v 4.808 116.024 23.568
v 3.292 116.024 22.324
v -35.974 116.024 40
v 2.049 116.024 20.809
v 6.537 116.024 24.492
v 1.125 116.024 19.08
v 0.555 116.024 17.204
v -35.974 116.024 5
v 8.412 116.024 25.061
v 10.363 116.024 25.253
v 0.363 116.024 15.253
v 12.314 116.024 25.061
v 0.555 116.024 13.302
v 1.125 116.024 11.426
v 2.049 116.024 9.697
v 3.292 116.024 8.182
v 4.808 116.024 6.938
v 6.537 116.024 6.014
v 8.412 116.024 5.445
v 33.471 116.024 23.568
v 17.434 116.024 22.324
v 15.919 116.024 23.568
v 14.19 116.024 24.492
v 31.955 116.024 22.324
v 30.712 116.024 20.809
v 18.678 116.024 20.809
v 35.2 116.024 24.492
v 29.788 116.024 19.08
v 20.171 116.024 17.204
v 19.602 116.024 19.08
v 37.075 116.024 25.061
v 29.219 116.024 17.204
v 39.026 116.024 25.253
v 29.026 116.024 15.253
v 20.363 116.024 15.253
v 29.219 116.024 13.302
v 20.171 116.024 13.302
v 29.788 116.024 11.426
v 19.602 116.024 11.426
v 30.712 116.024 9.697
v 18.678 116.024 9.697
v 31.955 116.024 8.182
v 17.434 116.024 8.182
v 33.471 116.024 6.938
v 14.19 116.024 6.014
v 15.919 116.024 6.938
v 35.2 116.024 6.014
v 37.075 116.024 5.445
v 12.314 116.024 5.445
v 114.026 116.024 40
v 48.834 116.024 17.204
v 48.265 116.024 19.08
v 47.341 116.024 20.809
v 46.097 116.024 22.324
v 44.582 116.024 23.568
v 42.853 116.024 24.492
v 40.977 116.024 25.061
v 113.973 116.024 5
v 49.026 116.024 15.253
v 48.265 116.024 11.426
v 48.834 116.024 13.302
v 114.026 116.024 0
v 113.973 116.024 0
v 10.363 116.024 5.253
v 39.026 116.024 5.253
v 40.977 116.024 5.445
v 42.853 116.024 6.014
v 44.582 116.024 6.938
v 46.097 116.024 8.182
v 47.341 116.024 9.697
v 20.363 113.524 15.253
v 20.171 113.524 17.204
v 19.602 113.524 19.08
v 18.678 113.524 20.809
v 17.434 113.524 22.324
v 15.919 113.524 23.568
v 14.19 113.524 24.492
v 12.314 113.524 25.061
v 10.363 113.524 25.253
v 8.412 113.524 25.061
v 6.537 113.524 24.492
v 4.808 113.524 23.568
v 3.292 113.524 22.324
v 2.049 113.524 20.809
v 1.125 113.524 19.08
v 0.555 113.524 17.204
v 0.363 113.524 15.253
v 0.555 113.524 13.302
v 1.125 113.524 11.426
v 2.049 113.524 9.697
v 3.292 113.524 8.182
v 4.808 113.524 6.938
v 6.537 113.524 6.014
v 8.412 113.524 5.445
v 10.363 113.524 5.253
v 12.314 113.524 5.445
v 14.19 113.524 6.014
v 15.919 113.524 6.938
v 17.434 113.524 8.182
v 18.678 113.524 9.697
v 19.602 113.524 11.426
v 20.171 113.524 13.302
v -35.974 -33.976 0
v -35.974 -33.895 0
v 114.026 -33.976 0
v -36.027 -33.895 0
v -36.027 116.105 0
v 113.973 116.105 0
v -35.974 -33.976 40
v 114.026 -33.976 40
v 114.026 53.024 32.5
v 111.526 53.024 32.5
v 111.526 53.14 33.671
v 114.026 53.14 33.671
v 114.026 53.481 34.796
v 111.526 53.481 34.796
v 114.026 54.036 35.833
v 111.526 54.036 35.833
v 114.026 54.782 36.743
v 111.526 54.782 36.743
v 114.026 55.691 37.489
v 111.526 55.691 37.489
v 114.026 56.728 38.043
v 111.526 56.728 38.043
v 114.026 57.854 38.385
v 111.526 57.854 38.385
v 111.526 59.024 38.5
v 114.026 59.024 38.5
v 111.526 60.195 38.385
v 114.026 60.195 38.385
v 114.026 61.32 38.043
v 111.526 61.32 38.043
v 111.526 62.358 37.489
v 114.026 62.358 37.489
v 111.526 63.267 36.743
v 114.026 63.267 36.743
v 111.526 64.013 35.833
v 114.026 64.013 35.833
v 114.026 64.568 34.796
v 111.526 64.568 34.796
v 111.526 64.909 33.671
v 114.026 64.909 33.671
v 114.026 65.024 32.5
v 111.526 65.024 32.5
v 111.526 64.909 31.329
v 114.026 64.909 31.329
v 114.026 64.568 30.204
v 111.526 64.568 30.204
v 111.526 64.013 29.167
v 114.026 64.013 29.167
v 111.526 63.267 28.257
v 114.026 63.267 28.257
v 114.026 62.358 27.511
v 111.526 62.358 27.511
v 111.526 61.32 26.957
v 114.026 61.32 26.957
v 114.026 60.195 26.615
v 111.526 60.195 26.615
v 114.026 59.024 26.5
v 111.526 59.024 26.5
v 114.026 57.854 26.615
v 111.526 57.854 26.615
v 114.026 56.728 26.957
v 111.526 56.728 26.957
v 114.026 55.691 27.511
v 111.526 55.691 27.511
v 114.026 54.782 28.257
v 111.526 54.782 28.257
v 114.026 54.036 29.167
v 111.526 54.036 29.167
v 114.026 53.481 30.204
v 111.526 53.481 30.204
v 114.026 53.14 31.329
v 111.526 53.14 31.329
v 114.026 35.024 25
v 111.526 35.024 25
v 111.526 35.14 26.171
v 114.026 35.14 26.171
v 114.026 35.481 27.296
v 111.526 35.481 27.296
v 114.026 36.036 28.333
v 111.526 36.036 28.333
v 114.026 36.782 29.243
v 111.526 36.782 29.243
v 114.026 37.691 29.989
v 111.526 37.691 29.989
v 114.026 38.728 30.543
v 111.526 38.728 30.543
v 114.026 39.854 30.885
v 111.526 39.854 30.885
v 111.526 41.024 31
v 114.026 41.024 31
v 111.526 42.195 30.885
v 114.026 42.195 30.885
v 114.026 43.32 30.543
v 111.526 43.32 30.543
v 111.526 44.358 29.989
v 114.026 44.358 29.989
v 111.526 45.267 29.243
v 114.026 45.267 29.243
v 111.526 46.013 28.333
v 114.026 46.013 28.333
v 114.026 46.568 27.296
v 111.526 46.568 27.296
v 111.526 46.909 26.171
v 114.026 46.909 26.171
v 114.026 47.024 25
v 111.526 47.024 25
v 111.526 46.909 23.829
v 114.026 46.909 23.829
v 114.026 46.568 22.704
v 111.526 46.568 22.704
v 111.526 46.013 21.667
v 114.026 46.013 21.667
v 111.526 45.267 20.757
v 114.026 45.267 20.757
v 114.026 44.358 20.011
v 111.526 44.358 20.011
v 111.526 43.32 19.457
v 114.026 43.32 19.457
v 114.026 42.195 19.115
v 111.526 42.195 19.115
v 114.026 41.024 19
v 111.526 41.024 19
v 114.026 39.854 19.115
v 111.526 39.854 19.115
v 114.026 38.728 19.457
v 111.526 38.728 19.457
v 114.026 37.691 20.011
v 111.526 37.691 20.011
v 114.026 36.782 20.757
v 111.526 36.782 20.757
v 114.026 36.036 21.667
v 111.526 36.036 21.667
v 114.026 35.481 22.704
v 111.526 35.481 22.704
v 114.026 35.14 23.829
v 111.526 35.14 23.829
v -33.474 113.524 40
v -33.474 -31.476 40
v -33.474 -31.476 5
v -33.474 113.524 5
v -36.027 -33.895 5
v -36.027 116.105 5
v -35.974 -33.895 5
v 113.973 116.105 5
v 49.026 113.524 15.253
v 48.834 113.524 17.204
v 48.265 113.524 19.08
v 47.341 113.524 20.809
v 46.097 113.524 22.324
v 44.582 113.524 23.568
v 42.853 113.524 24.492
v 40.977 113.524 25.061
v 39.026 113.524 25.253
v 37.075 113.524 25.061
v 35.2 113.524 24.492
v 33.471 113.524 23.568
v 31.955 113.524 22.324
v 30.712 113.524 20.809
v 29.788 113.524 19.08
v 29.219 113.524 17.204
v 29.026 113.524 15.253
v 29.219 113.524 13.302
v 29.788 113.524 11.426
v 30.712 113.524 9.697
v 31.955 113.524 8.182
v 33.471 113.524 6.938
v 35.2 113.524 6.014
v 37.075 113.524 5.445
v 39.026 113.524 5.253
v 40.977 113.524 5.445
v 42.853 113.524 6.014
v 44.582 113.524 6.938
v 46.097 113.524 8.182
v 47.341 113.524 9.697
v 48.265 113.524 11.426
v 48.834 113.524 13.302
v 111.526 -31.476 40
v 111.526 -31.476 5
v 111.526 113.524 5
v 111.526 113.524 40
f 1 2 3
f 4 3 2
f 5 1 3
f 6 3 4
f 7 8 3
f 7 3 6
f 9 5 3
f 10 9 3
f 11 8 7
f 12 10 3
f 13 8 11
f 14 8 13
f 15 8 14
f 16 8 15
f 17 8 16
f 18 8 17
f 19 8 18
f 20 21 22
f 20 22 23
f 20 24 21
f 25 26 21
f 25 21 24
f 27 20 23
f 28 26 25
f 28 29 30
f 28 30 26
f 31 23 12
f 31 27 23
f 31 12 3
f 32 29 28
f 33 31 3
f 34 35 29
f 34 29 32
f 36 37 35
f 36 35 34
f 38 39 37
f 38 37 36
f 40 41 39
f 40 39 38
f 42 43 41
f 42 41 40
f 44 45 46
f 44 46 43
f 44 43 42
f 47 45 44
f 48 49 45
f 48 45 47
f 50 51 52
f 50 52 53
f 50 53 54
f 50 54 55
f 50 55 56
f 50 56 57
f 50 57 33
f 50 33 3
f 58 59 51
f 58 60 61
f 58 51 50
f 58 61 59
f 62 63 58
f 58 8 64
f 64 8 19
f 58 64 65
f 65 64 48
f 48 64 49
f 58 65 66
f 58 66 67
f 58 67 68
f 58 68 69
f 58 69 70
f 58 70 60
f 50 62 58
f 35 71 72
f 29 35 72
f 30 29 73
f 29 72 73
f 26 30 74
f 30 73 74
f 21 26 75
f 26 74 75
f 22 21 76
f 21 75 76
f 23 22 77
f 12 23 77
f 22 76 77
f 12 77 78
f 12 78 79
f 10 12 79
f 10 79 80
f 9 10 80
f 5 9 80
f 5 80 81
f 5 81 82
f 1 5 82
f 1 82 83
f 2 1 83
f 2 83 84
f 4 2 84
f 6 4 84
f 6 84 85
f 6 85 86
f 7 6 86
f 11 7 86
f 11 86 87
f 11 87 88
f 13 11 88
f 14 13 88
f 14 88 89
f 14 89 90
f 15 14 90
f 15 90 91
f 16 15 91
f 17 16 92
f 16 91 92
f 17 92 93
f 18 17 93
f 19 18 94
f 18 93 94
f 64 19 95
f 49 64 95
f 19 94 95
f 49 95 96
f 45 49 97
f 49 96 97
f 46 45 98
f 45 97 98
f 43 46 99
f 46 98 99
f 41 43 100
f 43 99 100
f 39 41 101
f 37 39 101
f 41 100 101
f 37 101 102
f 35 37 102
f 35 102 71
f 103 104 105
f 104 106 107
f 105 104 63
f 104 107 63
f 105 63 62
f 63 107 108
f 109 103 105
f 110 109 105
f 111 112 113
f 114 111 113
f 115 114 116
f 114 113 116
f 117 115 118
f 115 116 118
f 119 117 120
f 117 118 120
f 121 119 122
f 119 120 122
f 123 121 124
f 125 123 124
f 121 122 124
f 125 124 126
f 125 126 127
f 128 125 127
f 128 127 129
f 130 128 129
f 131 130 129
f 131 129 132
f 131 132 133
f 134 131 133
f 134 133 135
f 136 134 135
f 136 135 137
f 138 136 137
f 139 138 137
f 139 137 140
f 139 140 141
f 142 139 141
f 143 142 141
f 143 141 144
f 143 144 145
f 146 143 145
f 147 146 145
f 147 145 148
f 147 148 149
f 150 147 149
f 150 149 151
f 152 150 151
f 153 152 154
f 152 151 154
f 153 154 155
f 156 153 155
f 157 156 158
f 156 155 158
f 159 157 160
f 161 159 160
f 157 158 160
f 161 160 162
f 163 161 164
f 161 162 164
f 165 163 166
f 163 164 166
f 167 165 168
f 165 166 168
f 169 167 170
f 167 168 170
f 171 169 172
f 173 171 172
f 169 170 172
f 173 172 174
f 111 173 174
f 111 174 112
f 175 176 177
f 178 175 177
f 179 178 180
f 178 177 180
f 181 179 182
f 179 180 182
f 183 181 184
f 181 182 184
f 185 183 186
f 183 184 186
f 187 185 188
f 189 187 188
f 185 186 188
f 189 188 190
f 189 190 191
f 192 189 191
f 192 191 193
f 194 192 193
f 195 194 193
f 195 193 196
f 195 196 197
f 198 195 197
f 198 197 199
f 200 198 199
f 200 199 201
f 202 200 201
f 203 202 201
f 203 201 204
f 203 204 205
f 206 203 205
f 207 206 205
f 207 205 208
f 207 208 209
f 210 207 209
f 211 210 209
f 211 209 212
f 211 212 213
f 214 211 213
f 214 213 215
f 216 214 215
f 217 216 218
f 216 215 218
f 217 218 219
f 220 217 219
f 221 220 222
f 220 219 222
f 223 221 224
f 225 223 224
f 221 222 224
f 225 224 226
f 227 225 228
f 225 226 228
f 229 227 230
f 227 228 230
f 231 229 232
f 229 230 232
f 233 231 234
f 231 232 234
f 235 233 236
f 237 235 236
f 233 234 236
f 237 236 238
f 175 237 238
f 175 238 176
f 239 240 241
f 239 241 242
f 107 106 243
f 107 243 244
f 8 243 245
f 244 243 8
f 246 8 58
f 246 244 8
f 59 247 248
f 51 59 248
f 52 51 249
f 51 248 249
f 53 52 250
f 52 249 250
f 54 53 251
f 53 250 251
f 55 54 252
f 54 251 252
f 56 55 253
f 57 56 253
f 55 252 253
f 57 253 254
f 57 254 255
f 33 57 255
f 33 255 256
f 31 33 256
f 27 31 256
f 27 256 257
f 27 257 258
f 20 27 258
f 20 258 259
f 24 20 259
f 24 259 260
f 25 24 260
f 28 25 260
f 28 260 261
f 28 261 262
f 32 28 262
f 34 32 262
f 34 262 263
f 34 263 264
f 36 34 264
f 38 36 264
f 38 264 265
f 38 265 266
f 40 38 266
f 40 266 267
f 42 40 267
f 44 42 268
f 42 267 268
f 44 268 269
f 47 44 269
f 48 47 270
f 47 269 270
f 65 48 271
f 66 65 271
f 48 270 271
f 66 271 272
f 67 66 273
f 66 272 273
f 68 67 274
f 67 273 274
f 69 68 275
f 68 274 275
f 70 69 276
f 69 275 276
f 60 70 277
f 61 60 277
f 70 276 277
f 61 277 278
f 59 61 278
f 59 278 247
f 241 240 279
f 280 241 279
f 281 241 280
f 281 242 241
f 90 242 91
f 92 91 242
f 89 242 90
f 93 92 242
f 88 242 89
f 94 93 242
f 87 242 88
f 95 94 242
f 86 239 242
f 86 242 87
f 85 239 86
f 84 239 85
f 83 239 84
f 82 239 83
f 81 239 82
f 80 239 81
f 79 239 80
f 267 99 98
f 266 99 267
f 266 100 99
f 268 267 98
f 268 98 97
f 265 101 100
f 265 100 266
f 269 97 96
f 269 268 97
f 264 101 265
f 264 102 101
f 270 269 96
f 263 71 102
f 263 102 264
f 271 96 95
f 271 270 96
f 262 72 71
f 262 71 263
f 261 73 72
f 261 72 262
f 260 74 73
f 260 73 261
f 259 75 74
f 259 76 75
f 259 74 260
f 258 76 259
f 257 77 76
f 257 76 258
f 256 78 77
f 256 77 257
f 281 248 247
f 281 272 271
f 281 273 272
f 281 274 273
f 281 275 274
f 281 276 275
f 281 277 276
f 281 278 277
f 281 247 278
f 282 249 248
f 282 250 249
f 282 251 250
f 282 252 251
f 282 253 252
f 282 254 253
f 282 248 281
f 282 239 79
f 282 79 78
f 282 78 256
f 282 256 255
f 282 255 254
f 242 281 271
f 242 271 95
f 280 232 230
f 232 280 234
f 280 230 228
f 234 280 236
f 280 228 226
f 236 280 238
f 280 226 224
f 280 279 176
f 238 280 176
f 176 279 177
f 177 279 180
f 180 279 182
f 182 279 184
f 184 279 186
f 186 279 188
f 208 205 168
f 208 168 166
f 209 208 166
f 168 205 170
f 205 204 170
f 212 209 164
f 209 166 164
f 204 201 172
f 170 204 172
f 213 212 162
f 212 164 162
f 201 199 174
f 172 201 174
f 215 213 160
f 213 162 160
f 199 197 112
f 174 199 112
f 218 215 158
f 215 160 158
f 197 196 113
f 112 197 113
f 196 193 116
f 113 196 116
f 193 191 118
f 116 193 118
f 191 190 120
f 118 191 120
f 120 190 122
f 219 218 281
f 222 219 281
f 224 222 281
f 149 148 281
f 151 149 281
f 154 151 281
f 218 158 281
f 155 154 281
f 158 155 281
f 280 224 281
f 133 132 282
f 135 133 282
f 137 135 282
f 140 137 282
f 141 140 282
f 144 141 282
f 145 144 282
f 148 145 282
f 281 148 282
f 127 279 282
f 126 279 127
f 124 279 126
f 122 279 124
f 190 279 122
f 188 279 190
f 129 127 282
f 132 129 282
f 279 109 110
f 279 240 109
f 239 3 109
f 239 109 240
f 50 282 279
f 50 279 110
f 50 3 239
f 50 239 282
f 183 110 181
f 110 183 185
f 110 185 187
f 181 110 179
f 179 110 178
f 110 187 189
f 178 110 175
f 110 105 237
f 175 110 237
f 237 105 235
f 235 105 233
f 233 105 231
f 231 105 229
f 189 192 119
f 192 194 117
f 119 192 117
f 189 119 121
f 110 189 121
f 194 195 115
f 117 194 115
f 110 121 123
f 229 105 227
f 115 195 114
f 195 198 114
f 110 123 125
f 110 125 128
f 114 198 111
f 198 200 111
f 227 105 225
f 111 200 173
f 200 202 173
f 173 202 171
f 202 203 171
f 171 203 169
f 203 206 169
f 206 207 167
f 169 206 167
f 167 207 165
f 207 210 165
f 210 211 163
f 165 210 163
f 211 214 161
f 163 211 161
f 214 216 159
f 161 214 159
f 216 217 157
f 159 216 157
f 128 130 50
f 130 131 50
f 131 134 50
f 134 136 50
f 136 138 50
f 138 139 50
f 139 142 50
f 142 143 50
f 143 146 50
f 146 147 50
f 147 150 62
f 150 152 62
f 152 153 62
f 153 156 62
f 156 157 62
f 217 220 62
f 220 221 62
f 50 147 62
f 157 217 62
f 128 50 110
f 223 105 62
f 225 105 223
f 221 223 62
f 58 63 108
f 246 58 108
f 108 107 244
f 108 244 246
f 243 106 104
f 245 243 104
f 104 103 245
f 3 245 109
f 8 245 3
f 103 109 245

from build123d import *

# Parameters (mm, degrees)
F0_W      = 150
F0_H      = 150
F1_DEPTH  = 40
F2_W      = 145
F2_H      = 145
F3_DEPTH  = 135
F6_D      = 20
F6_DEPTH  = 5
F6_TIP    = 6.0086061903
F7_W      = 150
F7_H      = 150
F8_DEPTH  = 5
F10_D     = 12
F10_DEPTH = 5
F10_TIP   = 3.6051637142


with BuildPart() as f1:
    # F0 (on Top) → F1 (new body)
    with BuildSketch(Plane.XY):
        with Locations((39.0263837129, 41.0243682017)):
            Rectangle(F0_W, F0_H)
    extrude(amount=F1_DEPTH)

    # F2 (on face) → F3 (cut)
    with BuildSketch(Plane.XY.offset(40)):
        with Locations((39.0263837129, 41.0243682017)):
            Rectangle(F2_W, F2_H)
    extrude(amount=-F3_DEPTH, mode=Mode.SUBTRACT)

    # F6
    with Locations(Plane(origin=(0, 116.0243682017, 0), x_dir=(-1, 0, 0), z_dir=(0, 1, 0))):
        with Locations((-39.0263837129, 15.2529580519), (-10.3633506224, 15.2529580519)):
            Hole(F6_D / 2, depth=F6_DEPTH)
            with Locations((0, 0, -(F6_DEPTH + F6_TIP / 2))):  # 118° drill point
                Cone(0, F6_D / 2, F6_TIP, mode=Mode.SUBTRACT)

    # F7 (on Top) → F8 (join)
    with BuildSketch(Plane.XY):
        with Locations((38.9731861651, 41.1050692201)):
            Rectangle(F7_W, F7_H)
    extrude(amount=F8_DEPTH)

    # F10
    with Locations(Plane.YZ.offset(114.0263837129)):
        with Locations((59.0243682017, 32.5), (41.0243682017, 25)):
            Hole(F10_D / 2, depth=F10_DEPTH)
            with Locations((0, 0, -(F10_DEPTH + F10_TIP / 2))):  # 118° drill point
                Cone(0, F10_D / 2, F10_TIP, mode=Mode.SUBTRACT)


solid = f1.part
